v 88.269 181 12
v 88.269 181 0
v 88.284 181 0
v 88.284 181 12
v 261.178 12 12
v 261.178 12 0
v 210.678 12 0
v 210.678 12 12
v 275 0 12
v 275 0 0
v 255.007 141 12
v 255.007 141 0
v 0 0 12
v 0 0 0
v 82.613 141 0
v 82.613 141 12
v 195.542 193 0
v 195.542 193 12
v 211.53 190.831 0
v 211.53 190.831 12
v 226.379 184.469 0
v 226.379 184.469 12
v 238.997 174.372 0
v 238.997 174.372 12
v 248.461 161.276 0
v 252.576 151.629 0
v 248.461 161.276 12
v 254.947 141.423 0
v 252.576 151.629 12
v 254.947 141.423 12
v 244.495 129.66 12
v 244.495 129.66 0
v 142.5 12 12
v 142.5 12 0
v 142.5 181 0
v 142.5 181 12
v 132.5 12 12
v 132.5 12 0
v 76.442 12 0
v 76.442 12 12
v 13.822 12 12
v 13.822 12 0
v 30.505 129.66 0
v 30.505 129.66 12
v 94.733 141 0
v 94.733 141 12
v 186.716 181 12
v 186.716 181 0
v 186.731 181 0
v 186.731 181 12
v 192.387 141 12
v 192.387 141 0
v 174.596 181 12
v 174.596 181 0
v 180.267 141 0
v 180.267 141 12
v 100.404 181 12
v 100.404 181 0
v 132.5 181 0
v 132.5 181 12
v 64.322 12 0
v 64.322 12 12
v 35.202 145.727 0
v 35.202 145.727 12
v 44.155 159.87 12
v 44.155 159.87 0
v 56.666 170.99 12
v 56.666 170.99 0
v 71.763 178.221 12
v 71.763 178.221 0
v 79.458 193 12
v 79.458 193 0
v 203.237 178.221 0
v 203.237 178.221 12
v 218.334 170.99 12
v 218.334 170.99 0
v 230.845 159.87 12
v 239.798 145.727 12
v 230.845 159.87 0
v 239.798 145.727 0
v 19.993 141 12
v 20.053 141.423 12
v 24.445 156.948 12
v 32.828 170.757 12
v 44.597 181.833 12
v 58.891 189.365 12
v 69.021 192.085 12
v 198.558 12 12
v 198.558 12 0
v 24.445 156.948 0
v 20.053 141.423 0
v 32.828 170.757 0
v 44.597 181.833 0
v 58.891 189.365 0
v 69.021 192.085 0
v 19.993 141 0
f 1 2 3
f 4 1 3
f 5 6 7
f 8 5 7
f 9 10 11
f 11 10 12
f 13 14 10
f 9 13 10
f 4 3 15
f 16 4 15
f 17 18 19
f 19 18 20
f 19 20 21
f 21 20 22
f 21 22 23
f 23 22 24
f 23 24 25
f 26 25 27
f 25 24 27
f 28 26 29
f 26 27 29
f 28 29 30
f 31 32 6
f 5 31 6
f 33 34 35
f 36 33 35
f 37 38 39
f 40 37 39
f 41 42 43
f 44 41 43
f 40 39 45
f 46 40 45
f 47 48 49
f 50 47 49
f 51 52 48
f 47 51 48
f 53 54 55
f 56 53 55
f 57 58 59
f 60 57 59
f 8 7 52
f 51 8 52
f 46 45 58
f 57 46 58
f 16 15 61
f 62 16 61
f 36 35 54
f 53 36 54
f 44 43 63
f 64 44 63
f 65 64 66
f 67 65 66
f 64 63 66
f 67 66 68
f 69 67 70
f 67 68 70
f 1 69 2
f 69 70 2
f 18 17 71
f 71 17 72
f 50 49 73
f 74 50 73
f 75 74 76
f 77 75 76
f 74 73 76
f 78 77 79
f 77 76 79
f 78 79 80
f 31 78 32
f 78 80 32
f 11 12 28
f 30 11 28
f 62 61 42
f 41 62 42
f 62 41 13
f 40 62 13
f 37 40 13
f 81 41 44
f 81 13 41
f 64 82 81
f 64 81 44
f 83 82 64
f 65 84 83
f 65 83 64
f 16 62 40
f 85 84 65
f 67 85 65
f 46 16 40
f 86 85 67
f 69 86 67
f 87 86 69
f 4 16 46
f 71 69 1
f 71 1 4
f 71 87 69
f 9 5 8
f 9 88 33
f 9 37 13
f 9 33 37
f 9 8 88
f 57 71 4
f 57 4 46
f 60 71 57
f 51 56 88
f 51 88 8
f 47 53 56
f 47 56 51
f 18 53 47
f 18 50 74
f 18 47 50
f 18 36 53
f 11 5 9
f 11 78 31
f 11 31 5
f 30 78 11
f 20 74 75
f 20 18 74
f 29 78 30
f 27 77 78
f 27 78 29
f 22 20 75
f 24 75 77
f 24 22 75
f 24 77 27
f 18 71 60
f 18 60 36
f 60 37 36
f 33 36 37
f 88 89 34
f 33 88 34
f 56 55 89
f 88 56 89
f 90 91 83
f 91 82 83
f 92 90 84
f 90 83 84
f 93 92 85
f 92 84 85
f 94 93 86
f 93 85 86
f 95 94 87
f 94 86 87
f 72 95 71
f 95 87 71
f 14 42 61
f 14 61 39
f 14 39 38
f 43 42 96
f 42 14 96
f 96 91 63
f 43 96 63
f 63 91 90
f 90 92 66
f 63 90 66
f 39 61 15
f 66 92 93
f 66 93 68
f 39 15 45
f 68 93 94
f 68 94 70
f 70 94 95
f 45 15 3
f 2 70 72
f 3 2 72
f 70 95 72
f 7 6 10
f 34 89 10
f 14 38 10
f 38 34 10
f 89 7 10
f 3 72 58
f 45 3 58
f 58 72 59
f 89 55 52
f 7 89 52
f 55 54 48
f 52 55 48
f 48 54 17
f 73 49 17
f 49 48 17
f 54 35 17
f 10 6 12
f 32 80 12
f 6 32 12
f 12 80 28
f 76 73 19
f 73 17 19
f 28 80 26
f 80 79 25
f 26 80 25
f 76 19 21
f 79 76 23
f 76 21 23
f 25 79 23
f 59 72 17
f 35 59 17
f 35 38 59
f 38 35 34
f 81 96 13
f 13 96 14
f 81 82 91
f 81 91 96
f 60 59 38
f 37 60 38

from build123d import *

# Parameters (mm, degrees)
F1_DEPTH    = 12
F2_T1_DEPTH = 12
F3_R        = 60


# Not quite as in the source:
# - a fillet or chamfer that OpenCascade refuses, or shapes differently, is made with other operations: its cross-section is extruded or revolved along the edge and cut away or added


with BuildPart() as f1:
    # F0 (on Top) → F1 (new body)
    with BuildSketch(Plane.XY):
        Polygon((132.5, 193), (132.5, 181), (137.5, 181), (142.5, 181), (142.5, 193), (137.5, 193), align=None)
        Polygon((27.3656716418, 193), (25.6641791045, 181), (37.7842070275, 181), (39.4856995648, 193), align=None)
        Polygon((25.6641791045, 181), (19.9925373134, 141), (32.1125652364, 141), (37.7842070275, 181), align=None)
        Polygon((19.9925373134, 141), (18.2910447761, 129), (30.4110726991, 129), (32.1125652364, 141), align=None)
        Polygon((237.2157929725, 181), (242.8874347636, 141), (255.0074626866, 141), (249.3358208955, 181), align=None)
        Polygon((235.5143004352, 193), (237.2157929725, 181), (249.3358208955, 181), (247.6343283582, 193), align=None)
        Polygon((242.8874347636, 141), (244.5889273009, 129), (256.7089552239, 129), (255.0074626866, 141), align=None)
        Polygon((244.5889273009, 129), (251.6784795397, 79), (263.7985074627, 79), (256.7089552239, 129), align=None)
        Polygon((251.6784795397, 79), (253.379972077, 67), (265.5, 67), (263.7985074627, 79), align=None)
        Polygon((132.5, 79), (132.5, 67), (137.5, 67), (142.5, 67), (142.5, 79), (137.5, 79), align=None)
        Polygon((253.379972077, 67), (261.1784795397, 12), (273.2985074627, 12), (265.5, 67), align=None)
        Polygon((261.1784795397, 12), (262.879972077, 0), (275, 0), (273.2985074627, 12), align=None)
        Polygon((13.8215204603, 12), (12.120027923, 0), (62.6201442689, 0), (64.3216368062, 12), align=None)
        Polygon((1.7014925373, 12), (0, 0), (12.120027923, 0), (13.8215204603, 12), align=None)
        Polygon((9.5, 67), (1.7014925373, 12), (13.8215204603, 12), (21.620027923, 67), align=None)
        Polygon((11.2014925373, 79), (9.5, 67), (21.620027923, 67), (23.3215204603, 79), align=None)
        Polygon((18.2910447761, 129), (11.2014925373, 79), (23.3215204603, 79), (30.4110726991, 129), align=None)
        Polygon((132.5, 141), (132.5, 129), (137.5, 129), (142.5, 129), (142.5, 141), (137.5, 141), align=None)
        Polygon((72.1201442689, 67), (64.3216368062, 12), (76.4416647292, 12), (84.2401721919, 67), align=None)
        Polygon((80.911189045, 129), (73.8216368062, 79), (85.9416647292, 79), (93.031216968, 129), align=None)
        Polygon((88.2843233734, 181), (82.6126815823, 141), (94.7327095053, 141), (100.4043512964, 181), align=None)
        Polygon((39.4856995648, 193), (37.7842070275, 181), (88.2843233734, 181), (89.9858159107, 193), align=None)
        Polygon((102.1058438337, 193), (100.4043512964, 181), (132.5, 181), (132.5, 193), align=None)
        Polygon((142.5, 193), (142.5, 181), (174.5956487036, 181), (172.8941561663, 193), align=None)
        Polygon((185.0141840893, 193), (186.7156766266, 181), (237.2157929725, 181), (235.5143004352, 193), align=None)
        Polygon((172.8941561663, 193), (174.5956487036, 181), (186.7156766266, 181), (185.0141840893, 193), align=None)
        Polygon((174.5956487036, 181), (180.2672904947, 141), (192.3873184177, 141), (186.7156766266, 181), align=None)
        Polygon((180.2672904947, 141), (181.968783032, 129), (194.088810955, 129), (192.3873184177, 141), align=None)
        Polygon((181.968783032, 129), (189.0583352708, 79), (201.1783631938, 79), (194.088810955, 129), align=None)
        Polygon((189.0583352708, 79), (190.7598278081, 67), (202.8798557311, 67), (201.1783631938, 79), align=None)
        Polygon((190.7598278081, 67), (198.5583352708, 12), (210.6783631938, 12), (202.8798557311, 67), align=None)
        Polygon((210.6783631938, 12), (212.3798557311, 0), (262.879972077, 0), (261.1784795397, 12), align=None)
        Polygon((198.5583352708, 12), (200.2598278081, 0), (212.3798557311, 0), (210.6783631938, 12), align=None)
        Polygon((142.5, 12), (142.5, 0), (200.2598278081, 0), (198.5583352708, 12), align=None)
        Polygon((132.5, 12), (132.5, 0), (142.5, 0), (142.5, 12), (137.5, 12), align=None)
        Polygon((76.4416647292, 12), (74.7401721919, 0), (132.5, 0), (132.5, 12), align=None)
        Polygon((64.3216368062, 12), (62.6201442689, 0), (74.7401721919, 0), (76.4416647292, 12), align=None)
        Polygon((132.5, 67), (132.5, 12), (137.5, 12), (142.5, 12), (142.5, 67), (137.5, 67), align=None)
        Polygon((132.5, 129), (132.5, 79), (137.5, 79), (142.5, 79), (142.5, 129), (137.5, 129), align=None)
        Polygon((132.5, 181), (132.5, 141), (137.5, 141), (142.5, 141), (142.5, 181), (137.5, 181), align=None)
        Polygon((89.9858159107, 193), (88.2843233734, 181), (100.4043512964, 181), (102.1058438337, 193), align=None)
        Polygon((82.6126815823, 141), (80.911189045, 129), (93.031216968, 129), (94.7327095053, 141), align=None)
        Polygon((73.8216368062, 79), (72.1201442689, 67), (84.2401721919, 67), (85.9416647292, 79), align=None)
    extrude(amount=F1_DEPTH)

    # F2: fillet of radius 60 on 2 edges, made by hand

    # F2_s2 → F2_t1 (join)
    with BuildSketch(Plane.XY):
        with BuildLine():
            ThreePointArc((186.7156872707, 181.0003998584), (225.0552814168, 165.8005010735), (244.5264534747, 129.4434541493))
            Line((244.5264534747, 129.4434541493), (250.4671955698, 130.2857981777))
            ThreePointArc((250.4671955698, 130.2857981777), (246.8116672993, 156.0640430257), (243.1565350676, 181.8423440284))
            Line((243.1565350676, 181.8423440284), (237.2157929725, 187.0001633397))
            ThreePointArc((237.2157929725, 187.0001633397), (211.9657401216, 187.0001633397), (186.8753527454, 186.9984384577))
            Line((186.8753527454, 186.9984384577), (186.7156872707, 181.0003998584))
        make_face()
        with BuildLine():
            ThreePointArc((30.4735465253, 129.4434541493), (49.9447185832, 165.8005010735), (88.2843127293, 181.0003998584))
            Line((88.2843127293, 181.0003998584), (88.1246472546, 186.9984384577))
            ThreePointArc((88.1246472546, 186.9984384577), (63.0342598784, 187.0001633397), (37.7842070275, 187.0001633397))
            Line((37.7842070275, 187.0001633397), (31.8434649324, 181.8423440284))
            ThreePointArc((31.8434649324, 181.8423440284), (28.1883327007, 156.0640430257), (24.5328044302, 130.2857981777))
            Line((24.5328044302, 130.2857981777), (30.4735465253, 129.4434541493))
        make_face()
    extrude(amount=F2_T1_DEPTH)

    # F3
    f3_edges = [f1.edges().sort_by_distance(p)[0] for p in [
        (27.365672, 193, 6),
        (247.634328, 193, 6),
    ]]
    fillet(f3_edges, radius=F3_R)


solid = f1.part
